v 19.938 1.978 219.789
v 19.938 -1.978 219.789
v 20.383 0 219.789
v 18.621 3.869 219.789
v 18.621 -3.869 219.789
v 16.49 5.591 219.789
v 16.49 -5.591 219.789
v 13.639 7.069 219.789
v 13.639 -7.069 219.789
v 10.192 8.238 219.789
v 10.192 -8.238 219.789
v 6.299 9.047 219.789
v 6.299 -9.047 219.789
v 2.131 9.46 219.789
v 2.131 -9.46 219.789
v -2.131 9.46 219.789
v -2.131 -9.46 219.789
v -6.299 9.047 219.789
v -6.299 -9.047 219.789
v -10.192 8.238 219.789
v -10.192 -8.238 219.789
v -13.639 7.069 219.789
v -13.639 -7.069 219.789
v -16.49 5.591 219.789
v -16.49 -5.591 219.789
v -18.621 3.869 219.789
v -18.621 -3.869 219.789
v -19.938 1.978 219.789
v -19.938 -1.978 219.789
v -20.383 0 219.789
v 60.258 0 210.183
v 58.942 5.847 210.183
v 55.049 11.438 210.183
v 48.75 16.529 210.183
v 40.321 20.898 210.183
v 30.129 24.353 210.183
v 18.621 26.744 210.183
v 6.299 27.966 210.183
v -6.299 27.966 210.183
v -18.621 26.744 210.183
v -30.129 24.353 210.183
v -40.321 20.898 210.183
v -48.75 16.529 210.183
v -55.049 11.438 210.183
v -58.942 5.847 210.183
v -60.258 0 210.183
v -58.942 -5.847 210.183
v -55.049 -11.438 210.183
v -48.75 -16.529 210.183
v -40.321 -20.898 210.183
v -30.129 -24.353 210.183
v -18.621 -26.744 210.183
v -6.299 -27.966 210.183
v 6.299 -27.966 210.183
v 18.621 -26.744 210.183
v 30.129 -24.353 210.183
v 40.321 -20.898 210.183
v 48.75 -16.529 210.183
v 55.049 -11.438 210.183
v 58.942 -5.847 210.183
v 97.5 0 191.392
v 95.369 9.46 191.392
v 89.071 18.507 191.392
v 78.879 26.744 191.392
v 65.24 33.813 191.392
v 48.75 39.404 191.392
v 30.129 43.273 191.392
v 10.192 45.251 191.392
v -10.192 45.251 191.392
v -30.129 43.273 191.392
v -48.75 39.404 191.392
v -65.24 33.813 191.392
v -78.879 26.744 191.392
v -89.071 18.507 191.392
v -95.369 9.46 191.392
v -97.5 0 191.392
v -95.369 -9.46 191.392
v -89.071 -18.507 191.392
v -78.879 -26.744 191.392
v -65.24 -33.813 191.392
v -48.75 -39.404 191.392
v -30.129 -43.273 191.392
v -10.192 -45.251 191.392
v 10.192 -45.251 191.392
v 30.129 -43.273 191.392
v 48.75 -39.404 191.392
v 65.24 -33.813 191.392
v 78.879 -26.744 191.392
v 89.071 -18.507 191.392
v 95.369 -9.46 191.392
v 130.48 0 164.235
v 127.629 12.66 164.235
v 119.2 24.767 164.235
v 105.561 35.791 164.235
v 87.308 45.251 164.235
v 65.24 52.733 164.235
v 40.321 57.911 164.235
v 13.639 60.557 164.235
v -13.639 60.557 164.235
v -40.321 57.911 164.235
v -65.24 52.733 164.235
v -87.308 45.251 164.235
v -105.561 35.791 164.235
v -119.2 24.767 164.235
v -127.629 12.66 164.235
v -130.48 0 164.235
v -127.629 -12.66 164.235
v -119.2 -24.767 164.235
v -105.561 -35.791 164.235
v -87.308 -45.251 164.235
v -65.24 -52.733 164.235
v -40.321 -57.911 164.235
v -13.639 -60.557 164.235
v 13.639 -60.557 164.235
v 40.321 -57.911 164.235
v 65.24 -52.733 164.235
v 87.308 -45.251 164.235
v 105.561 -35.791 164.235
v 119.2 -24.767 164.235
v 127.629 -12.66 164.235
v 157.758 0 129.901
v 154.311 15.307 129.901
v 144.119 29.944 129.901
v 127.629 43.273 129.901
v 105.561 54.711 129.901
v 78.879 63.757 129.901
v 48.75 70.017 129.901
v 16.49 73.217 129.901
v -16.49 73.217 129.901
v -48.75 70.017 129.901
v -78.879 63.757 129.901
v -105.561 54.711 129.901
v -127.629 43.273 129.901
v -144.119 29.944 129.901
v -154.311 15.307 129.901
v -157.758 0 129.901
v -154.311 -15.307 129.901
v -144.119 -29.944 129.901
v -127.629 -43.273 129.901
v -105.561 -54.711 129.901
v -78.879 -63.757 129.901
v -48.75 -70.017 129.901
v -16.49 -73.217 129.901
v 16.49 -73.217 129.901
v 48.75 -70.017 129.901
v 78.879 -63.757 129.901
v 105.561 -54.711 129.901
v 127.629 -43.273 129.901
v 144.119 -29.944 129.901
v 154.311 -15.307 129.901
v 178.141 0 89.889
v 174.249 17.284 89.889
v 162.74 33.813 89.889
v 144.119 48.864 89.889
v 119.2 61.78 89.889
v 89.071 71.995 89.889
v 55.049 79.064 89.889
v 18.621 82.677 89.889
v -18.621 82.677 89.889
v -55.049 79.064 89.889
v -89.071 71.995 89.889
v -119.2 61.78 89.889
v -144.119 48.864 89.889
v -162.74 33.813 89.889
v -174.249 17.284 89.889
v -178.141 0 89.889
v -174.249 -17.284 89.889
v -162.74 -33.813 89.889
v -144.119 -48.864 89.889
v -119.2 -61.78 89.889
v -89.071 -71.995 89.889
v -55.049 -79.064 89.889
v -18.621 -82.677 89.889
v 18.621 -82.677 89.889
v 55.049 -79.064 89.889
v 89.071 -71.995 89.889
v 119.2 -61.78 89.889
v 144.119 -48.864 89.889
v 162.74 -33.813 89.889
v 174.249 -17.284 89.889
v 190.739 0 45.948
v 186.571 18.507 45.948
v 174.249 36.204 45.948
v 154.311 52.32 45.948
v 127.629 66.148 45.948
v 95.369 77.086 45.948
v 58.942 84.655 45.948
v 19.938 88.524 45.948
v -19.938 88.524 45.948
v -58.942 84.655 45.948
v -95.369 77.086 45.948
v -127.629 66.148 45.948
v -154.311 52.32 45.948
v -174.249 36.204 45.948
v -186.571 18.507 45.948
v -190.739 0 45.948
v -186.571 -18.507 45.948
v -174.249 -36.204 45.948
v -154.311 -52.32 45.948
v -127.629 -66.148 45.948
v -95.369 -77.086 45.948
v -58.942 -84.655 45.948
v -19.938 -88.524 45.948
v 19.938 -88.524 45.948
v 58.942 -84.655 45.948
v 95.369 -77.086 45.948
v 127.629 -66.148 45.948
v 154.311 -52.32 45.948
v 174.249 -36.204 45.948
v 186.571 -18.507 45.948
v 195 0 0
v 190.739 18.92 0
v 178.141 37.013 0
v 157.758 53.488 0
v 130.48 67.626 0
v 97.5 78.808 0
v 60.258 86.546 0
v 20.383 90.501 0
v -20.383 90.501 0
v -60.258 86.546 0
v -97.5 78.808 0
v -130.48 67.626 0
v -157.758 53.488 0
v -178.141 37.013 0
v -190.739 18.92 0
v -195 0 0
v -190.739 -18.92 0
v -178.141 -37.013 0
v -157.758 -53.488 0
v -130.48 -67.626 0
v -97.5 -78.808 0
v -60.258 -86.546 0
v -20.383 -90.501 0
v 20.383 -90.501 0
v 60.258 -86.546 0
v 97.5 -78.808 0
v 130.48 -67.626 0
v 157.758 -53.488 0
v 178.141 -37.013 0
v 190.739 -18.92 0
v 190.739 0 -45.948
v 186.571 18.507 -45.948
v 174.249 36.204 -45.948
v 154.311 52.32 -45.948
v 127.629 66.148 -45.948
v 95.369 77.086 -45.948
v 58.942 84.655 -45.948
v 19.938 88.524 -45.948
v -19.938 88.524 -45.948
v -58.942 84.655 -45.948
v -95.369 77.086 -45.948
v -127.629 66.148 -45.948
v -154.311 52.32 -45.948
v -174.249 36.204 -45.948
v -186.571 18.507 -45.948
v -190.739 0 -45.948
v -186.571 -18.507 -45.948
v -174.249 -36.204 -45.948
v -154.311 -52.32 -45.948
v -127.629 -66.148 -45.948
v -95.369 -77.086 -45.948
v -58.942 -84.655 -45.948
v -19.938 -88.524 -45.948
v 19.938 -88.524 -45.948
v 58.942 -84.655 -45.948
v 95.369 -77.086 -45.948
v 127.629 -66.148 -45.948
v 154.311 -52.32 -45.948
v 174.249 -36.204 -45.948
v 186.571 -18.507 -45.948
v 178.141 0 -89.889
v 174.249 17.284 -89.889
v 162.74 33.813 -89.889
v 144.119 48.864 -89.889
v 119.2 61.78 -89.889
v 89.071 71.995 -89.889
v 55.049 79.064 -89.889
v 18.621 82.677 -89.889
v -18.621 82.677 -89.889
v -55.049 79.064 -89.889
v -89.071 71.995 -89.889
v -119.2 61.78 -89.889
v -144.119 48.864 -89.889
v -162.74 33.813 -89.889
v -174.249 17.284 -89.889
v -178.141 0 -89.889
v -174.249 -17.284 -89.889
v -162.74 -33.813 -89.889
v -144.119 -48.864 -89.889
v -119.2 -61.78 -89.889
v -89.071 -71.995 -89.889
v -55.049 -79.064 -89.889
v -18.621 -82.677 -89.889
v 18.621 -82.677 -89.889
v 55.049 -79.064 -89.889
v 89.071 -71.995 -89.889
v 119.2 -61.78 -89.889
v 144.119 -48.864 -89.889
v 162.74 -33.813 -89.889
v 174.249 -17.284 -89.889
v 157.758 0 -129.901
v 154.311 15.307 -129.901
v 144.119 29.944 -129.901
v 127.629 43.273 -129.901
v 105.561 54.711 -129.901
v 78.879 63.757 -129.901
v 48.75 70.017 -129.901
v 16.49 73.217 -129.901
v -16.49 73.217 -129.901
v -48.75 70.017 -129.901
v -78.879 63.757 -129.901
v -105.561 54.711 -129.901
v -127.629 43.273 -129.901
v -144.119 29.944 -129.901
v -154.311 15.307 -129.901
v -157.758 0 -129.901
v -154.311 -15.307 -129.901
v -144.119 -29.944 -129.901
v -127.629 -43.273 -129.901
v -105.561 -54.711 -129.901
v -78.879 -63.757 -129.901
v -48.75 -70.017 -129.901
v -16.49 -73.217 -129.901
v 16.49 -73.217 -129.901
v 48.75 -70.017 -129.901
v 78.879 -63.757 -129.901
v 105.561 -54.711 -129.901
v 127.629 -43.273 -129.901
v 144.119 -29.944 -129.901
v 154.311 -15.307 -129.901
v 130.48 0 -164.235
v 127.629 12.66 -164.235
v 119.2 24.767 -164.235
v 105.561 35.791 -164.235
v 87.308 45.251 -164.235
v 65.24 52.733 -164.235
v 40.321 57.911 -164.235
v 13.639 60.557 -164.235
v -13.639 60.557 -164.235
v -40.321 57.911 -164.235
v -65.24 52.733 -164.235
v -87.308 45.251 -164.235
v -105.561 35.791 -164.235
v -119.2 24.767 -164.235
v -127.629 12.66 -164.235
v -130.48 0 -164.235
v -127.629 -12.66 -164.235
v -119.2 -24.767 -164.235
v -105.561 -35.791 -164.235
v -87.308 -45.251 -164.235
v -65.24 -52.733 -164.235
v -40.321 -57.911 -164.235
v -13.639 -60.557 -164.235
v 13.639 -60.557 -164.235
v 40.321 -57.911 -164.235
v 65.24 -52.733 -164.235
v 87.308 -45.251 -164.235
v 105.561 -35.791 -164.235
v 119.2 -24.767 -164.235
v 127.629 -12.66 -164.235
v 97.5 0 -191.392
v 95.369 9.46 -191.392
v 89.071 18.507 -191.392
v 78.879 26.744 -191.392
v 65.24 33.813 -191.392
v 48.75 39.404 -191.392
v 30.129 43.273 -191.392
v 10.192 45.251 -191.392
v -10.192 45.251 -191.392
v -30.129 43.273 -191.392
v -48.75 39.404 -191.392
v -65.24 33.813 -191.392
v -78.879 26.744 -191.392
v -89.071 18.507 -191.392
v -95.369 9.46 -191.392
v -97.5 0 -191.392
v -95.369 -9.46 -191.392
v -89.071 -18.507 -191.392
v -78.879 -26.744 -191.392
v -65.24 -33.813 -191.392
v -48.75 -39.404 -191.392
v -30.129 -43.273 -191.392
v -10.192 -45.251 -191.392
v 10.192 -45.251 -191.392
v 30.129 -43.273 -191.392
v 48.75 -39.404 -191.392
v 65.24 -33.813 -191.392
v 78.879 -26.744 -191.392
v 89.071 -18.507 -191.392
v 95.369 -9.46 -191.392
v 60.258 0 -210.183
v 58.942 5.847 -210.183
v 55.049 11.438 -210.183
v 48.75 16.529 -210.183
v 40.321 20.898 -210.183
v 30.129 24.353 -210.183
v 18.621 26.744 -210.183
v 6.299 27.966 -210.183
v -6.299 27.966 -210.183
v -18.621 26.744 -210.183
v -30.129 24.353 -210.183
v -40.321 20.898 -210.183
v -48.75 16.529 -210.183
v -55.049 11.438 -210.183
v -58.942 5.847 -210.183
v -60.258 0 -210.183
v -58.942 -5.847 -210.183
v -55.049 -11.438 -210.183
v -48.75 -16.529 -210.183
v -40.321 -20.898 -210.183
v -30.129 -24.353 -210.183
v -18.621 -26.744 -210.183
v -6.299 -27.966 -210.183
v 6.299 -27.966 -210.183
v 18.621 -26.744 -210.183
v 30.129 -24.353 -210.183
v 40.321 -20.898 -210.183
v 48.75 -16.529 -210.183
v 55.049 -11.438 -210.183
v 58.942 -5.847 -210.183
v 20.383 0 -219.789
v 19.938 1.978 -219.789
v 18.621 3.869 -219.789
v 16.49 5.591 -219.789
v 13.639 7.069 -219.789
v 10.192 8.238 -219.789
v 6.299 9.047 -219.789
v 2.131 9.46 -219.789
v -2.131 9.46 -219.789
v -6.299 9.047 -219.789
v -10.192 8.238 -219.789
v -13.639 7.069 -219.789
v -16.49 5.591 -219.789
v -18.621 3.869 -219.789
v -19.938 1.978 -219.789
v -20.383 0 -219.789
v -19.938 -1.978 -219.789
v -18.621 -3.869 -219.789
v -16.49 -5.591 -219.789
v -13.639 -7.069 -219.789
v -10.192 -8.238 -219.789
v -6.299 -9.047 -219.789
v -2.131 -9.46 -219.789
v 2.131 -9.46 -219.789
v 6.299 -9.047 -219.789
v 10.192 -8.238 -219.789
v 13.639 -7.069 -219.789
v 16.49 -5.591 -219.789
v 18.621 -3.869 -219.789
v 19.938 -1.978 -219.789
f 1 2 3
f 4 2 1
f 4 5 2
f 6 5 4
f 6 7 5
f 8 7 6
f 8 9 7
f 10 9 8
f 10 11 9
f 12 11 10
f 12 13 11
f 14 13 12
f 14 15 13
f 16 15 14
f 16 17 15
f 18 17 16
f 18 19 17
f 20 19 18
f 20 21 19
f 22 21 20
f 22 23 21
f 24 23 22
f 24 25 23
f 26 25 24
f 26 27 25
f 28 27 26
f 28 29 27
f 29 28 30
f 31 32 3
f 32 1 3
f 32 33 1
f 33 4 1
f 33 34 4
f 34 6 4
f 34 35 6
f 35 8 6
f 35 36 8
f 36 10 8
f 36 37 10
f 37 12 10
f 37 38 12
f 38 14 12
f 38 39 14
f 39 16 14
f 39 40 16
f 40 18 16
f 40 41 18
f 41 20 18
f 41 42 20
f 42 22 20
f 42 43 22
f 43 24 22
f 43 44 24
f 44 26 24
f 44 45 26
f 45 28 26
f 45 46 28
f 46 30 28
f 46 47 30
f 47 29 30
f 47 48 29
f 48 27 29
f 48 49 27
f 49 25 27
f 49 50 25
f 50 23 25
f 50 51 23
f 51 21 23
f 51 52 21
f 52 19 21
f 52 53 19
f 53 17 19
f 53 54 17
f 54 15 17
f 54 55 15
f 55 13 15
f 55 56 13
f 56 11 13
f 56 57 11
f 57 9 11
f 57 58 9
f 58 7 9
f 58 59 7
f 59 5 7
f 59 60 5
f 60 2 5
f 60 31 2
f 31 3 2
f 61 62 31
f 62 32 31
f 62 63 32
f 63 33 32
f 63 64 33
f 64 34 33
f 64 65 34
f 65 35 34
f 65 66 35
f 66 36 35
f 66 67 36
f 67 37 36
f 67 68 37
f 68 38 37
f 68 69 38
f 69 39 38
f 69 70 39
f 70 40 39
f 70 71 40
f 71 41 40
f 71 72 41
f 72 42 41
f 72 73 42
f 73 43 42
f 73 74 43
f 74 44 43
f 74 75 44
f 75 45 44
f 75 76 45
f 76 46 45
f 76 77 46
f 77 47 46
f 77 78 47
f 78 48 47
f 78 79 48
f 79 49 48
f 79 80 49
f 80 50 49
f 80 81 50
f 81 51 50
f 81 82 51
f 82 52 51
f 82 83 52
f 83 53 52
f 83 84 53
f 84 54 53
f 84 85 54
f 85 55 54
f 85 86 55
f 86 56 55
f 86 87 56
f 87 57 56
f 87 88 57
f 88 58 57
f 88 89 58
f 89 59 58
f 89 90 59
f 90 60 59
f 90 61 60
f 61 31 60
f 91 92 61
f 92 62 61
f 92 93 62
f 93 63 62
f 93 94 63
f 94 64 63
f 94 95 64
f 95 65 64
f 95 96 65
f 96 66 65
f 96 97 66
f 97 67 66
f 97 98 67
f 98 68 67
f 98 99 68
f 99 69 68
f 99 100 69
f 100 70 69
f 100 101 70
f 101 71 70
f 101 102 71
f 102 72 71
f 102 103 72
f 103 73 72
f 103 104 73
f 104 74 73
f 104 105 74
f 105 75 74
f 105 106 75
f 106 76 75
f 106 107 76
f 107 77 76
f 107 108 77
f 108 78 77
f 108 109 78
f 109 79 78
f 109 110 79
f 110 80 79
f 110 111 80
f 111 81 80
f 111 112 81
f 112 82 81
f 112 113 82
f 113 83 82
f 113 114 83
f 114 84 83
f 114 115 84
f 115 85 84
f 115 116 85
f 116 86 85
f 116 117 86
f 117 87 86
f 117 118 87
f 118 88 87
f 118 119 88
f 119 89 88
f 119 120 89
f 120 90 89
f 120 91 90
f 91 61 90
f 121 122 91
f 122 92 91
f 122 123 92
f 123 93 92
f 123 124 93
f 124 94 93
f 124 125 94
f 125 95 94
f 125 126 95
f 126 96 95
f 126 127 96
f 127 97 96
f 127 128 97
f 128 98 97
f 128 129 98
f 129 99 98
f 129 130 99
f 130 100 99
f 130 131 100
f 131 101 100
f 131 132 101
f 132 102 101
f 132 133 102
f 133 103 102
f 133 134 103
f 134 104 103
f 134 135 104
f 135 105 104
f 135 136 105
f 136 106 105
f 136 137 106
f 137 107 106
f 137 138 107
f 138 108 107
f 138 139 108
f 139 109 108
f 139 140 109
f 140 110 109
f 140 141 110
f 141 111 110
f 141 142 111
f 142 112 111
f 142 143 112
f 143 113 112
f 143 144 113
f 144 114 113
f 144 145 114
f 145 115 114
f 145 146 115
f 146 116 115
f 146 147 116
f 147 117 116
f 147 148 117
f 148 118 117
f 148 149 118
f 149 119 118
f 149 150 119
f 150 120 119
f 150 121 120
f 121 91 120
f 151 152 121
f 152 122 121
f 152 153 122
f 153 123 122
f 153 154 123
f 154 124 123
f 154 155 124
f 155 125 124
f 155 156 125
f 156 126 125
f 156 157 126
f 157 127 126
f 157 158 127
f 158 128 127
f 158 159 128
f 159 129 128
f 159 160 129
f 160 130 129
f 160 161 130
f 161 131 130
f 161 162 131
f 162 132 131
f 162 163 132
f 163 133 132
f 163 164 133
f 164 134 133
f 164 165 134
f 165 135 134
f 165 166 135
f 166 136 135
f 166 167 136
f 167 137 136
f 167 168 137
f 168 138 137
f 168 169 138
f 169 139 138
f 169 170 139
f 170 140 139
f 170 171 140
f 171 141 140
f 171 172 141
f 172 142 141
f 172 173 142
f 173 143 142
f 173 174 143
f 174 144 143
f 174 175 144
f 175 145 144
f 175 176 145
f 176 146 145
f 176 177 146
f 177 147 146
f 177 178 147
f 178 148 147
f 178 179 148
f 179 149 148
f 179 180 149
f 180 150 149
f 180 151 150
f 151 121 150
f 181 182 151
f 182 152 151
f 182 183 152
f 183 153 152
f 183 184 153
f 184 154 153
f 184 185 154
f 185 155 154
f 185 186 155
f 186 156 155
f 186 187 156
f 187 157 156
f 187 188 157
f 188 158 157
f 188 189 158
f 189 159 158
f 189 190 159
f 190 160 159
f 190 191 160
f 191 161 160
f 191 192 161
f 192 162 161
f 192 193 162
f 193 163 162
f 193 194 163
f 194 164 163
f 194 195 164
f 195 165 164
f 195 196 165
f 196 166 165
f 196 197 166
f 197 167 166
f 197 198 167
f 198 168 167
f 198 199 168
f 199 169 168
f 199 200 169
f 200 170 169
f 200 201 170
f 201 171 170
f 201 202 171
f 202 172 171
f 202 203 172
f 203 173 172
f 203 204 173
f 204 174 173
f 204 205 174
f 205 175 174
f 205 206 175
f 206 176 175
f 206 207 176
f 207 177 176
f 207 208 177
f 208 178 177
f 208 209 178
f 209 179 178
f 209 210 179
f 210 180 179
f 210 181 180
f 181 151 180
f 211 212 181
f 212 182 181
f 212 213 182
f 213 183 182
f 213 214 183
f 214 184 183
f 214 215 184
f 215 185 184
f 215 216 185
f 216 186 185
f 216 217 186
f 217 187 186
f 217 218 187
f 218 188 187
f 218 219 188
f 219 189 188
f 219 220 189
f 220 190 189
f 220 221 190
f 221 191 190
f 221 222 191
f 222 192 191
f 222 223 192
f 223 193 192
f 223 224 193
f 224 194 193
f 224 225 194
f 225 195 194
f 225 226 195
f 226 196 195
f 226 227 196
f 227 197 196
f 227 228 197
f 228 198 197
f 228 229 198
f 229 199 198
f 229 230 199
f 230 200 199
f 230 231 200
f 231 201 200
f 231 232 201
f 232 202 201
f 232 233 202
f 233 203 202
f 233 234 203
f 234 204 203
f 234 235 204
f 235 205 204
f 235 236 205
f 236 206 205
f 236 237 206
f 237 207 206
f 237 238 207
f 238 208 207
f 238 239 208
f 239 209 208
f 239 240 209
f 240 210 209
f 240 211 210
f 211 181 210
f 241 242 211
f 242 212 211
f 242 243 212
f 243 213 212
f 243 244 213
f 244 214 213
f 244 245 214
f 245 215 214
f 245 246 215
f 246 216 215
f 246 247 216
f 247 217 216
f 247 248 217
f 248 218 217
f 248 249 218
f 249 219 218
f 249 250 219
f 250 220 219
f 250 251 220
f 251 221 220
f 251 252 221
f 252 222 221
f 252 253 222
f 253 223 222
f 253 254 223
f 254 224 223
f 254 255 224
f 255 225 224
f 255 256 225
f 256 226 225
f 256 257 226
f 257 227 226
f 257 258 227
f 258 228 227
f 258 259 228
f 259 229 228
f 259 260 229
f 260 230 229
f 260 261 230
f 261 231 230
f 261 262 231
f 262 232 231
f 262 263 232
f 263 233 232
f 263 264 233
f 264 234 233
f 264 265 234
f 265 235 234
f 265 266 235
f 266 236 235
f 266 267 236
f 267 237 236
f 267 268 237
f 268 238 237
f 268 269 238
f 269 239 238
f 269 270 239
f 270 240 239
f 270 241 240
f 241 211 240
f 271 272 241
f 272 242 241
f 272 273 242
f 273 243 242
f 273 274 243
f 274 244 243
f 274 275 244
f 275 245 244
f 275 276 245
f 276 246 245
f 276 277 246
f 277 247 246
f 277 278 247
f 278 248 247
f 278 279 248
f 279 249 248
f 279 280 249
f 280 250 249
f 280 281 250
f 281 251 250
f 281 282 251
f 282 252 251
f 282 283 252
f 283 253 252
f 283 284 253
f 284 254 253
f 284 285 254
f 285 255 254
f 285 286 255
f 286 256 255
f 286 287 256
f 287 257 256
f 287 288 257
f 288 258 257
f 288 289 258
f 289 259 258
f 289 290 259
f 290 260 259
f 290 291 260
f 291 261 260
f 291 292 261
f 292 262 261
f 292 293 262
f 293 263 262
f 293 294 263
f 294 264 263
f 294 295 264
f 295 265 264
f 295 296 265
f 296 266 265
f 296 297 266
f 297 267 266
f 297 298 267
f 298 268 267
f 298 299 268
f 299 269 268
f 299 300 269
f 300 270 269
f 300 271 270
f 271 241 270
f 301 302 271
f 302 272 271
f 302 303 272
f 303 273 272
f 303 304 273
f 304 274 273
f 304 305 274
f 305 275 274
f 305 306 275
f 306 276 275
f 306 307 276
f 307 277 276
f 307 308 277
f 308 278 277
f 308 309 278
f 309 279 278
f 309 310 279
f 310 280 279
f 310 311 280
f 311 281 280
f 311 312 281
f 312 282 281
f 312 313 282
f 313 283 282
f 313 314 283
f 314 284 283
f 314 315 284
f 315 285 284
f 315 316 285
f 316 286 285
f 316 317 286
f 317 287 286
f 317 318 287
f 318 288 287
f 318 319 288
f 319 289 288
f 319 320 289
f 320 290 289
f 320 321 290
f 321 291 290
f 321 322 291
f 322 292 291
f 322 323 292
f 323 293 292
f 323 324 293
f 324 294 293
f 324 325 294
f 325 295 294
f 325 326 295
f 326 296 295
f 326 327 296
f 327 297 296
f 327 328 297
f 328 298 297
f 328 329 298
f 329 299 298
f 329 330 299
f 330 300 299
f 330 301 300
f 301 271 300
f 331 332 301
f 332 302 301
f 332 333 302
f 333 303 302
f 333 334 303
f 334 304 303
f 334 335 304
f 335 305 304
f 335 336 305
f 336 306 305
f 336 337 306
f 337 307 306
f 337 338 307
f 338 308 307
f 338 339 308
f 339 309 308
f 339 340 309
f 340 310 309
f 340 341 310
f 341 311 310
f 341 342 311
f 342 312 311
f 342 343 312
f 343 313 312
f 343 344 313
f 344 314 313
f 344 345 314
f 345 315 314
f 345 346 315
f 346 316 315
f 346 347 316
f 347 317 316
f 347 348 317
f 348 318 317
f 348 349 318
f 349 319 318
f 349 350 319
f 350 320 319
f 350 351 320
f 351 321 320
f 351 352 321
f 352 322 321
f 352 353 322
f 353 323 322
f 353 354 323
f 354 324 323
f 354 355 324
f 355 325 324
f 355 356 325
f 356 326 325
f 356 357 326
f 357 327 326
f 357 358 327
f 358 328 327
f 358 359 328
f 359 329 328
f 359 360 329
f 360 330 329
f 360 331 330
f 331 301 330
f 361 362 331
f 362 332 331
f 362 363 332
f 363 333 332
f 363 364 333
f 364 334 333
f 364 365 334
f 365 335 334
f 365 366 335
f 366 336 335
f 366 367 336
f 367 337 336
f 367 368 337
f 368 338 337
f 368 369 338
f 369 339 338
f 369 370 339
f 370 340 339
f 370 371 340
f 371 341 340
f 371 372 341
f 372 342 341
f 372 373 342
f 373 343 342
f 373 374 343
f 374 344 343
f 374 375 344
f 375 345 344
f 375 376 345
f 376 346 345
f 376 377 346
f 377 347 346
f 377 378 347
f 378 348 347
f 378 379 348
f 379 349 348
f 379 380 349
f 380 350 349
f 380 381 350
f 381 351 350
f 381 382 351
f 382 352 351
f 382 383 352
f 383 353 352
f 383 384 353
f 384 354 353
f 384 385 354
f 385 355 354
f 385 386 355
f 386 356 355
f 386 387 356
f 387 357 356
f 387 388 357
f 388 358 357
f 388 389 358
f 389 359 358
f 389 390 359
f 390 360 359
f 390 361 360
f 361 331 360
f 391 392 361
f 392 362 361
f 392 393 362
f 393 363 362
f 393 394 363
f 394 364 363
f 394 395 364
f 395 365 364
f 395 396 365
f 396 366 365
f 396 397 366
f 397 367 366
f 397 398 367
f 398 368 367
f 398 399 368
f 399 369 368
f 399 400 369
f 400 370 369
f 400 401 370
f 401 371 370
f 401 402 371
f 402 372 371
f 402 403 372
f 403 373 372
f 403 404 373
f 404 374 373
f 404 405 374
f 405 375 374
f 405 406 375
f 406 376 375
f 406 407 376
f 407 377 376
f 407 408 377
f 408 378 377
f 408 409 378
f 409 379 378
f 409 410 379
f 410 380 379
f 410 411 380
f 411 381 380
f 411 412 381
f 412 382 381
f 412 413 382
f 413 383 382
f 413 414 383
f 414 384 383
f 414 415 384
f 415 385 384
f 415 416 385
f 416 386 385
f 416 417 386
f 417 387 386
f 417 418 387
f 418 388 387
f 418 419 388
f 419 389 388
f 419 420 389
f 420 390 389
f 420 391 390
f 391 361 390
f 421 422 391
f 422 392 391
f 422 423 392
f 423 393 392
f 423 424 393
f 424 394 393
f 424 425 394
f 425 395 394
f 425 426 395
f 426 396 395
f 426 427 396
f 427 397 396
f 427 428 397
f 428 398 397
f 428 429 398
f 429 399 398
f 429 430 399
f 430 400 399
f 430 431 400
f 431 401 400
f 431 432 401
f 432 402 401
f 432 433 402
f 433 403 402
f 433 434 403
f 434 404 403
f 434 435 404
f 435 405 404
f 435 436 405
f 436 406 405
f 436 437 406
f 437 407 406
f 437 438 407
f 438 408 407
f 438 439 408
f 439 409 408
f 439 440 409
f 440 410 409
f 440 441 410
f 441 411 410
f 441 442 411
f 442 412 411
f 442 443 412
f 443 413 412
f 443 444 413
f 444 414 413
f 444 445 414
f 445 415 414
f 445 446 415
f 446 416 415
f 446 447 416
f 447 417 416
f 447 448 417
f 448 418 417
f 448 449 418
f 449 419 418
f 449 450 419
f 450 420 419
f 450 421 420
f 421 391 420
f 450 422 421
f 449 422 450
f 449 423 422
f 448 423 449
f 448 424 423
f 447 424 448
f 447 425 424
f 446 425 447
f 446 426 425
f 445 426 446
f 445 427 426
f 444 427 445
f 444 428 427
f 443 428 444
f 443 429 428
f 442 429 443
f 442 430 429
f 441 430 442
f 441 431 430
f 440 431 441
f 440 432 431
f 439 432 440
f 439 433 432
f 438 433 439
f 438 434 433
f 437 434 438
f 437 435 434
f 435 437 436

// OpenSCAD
// Generated by SolidPython 1.0.1 on 2020-07-29 00:46:51


scale(v = [15, 7, 17]) {
	sphere(r = 13);
}
/***********************************************
*********      SolidPython code:      **********
************************************************
 
# import packages: SolidPython
from solid import *
from solid.utils import *
from itertools import chain, combinations, permutations


class Resize:

    def __init__(self, scad_file):
        self.scad_file = scad_file
        #self.scad_file = import_scad(scad_file)
        # cone/cylinder param:
        self.r1 = 0
        self.r2 = 0
        self.h = 0
        # rectangular prism param:
        self.w = 0
        self.l = 0
        # ellipse param:
        self.r = 0

    # import OpenScad code (file name corresponds to shape)


    # classify shape + parameters
    def assign(self, param1, param2, param3):
        if self.scad_file == 'cone.scad':
            self.r1 = param1
            self.r2 = param2
            self.h = param3
        elif self.scad_file == 'cylinder.scad':
            self.r1 = param1
            self.r2 = param2
            self.h = param3
        elif self.scad_file == 'rectangularPrism.scad':
            self.h = param1
            self.l = param2
            self.w = param3
        else:
            self.r = param1
            self.h = param2

    # resize parameters
    def iterate(self):
        x = range(3, 20, 2)
        i = 1
        if self.scad_file == 'cone.scad':
            tempList = list(permutations(x, 2))
            for temp in tempList:
                param1 = temp[0]
                param2 = temp[1]
                filepath = 'produced_scad_files/' + 'cone' + str(param1) + '_' + str(param2) + '_' + '.scad'
                scad_render_to_file(cylinder(h=param1, r1=param2, r2=0), filepath)

        elif self.scad_file == 'cylinder.scad':
            tempList = list(permutations(x, 3))
            for temp in tempList:
                param1 = temp[0]
                param2 = temp[1]
                filepath = 'produced_scad_files/' + 'cylinder' + str(param1) + '_' + str(param2) + '_' + '.scad'
                scad_render_to_file(cylinder(h=param1, r1=param2, r2=param2), filepath)

        elif self.scad_file == 'rectangularPrism.scad':
            tempList = list(permutations(x, 3))
            for temp in tempList:
                param1 = temp[0]
                param2 = temp[1]
                param3 = temp[2]
                filepath = 'produced_scad_files/' + 'rectangularPrism' + str(param1) + '_' + str(param2) + '_' + str(
                    param3) + '.scad'
                scad_render_to_file(cube(size=(param1, param2, param3)), filepath)

        elif self.scad_file == 'ellipse.scad':
            tempList = list(permutations(x, 4))
            for temp in tempList:
                param1 = temp[0]
                param2 = temp[1]
                param3 = temp[2]
                param4 = temp[3]
                filepath = 'produced_scad_files/' + 'ellipse' + str(param1) + '_' + str(param2) + '_' + str(param3) + '_' + str(param4) + '.scad'
                scad_render_to_file(scale([param1, param2, param3])(sphere(r=param4)), filepath)

    def render_to_scadfile(self):
        scad_render_to_file(scad, 'example.scad') 
 
************************************************/
